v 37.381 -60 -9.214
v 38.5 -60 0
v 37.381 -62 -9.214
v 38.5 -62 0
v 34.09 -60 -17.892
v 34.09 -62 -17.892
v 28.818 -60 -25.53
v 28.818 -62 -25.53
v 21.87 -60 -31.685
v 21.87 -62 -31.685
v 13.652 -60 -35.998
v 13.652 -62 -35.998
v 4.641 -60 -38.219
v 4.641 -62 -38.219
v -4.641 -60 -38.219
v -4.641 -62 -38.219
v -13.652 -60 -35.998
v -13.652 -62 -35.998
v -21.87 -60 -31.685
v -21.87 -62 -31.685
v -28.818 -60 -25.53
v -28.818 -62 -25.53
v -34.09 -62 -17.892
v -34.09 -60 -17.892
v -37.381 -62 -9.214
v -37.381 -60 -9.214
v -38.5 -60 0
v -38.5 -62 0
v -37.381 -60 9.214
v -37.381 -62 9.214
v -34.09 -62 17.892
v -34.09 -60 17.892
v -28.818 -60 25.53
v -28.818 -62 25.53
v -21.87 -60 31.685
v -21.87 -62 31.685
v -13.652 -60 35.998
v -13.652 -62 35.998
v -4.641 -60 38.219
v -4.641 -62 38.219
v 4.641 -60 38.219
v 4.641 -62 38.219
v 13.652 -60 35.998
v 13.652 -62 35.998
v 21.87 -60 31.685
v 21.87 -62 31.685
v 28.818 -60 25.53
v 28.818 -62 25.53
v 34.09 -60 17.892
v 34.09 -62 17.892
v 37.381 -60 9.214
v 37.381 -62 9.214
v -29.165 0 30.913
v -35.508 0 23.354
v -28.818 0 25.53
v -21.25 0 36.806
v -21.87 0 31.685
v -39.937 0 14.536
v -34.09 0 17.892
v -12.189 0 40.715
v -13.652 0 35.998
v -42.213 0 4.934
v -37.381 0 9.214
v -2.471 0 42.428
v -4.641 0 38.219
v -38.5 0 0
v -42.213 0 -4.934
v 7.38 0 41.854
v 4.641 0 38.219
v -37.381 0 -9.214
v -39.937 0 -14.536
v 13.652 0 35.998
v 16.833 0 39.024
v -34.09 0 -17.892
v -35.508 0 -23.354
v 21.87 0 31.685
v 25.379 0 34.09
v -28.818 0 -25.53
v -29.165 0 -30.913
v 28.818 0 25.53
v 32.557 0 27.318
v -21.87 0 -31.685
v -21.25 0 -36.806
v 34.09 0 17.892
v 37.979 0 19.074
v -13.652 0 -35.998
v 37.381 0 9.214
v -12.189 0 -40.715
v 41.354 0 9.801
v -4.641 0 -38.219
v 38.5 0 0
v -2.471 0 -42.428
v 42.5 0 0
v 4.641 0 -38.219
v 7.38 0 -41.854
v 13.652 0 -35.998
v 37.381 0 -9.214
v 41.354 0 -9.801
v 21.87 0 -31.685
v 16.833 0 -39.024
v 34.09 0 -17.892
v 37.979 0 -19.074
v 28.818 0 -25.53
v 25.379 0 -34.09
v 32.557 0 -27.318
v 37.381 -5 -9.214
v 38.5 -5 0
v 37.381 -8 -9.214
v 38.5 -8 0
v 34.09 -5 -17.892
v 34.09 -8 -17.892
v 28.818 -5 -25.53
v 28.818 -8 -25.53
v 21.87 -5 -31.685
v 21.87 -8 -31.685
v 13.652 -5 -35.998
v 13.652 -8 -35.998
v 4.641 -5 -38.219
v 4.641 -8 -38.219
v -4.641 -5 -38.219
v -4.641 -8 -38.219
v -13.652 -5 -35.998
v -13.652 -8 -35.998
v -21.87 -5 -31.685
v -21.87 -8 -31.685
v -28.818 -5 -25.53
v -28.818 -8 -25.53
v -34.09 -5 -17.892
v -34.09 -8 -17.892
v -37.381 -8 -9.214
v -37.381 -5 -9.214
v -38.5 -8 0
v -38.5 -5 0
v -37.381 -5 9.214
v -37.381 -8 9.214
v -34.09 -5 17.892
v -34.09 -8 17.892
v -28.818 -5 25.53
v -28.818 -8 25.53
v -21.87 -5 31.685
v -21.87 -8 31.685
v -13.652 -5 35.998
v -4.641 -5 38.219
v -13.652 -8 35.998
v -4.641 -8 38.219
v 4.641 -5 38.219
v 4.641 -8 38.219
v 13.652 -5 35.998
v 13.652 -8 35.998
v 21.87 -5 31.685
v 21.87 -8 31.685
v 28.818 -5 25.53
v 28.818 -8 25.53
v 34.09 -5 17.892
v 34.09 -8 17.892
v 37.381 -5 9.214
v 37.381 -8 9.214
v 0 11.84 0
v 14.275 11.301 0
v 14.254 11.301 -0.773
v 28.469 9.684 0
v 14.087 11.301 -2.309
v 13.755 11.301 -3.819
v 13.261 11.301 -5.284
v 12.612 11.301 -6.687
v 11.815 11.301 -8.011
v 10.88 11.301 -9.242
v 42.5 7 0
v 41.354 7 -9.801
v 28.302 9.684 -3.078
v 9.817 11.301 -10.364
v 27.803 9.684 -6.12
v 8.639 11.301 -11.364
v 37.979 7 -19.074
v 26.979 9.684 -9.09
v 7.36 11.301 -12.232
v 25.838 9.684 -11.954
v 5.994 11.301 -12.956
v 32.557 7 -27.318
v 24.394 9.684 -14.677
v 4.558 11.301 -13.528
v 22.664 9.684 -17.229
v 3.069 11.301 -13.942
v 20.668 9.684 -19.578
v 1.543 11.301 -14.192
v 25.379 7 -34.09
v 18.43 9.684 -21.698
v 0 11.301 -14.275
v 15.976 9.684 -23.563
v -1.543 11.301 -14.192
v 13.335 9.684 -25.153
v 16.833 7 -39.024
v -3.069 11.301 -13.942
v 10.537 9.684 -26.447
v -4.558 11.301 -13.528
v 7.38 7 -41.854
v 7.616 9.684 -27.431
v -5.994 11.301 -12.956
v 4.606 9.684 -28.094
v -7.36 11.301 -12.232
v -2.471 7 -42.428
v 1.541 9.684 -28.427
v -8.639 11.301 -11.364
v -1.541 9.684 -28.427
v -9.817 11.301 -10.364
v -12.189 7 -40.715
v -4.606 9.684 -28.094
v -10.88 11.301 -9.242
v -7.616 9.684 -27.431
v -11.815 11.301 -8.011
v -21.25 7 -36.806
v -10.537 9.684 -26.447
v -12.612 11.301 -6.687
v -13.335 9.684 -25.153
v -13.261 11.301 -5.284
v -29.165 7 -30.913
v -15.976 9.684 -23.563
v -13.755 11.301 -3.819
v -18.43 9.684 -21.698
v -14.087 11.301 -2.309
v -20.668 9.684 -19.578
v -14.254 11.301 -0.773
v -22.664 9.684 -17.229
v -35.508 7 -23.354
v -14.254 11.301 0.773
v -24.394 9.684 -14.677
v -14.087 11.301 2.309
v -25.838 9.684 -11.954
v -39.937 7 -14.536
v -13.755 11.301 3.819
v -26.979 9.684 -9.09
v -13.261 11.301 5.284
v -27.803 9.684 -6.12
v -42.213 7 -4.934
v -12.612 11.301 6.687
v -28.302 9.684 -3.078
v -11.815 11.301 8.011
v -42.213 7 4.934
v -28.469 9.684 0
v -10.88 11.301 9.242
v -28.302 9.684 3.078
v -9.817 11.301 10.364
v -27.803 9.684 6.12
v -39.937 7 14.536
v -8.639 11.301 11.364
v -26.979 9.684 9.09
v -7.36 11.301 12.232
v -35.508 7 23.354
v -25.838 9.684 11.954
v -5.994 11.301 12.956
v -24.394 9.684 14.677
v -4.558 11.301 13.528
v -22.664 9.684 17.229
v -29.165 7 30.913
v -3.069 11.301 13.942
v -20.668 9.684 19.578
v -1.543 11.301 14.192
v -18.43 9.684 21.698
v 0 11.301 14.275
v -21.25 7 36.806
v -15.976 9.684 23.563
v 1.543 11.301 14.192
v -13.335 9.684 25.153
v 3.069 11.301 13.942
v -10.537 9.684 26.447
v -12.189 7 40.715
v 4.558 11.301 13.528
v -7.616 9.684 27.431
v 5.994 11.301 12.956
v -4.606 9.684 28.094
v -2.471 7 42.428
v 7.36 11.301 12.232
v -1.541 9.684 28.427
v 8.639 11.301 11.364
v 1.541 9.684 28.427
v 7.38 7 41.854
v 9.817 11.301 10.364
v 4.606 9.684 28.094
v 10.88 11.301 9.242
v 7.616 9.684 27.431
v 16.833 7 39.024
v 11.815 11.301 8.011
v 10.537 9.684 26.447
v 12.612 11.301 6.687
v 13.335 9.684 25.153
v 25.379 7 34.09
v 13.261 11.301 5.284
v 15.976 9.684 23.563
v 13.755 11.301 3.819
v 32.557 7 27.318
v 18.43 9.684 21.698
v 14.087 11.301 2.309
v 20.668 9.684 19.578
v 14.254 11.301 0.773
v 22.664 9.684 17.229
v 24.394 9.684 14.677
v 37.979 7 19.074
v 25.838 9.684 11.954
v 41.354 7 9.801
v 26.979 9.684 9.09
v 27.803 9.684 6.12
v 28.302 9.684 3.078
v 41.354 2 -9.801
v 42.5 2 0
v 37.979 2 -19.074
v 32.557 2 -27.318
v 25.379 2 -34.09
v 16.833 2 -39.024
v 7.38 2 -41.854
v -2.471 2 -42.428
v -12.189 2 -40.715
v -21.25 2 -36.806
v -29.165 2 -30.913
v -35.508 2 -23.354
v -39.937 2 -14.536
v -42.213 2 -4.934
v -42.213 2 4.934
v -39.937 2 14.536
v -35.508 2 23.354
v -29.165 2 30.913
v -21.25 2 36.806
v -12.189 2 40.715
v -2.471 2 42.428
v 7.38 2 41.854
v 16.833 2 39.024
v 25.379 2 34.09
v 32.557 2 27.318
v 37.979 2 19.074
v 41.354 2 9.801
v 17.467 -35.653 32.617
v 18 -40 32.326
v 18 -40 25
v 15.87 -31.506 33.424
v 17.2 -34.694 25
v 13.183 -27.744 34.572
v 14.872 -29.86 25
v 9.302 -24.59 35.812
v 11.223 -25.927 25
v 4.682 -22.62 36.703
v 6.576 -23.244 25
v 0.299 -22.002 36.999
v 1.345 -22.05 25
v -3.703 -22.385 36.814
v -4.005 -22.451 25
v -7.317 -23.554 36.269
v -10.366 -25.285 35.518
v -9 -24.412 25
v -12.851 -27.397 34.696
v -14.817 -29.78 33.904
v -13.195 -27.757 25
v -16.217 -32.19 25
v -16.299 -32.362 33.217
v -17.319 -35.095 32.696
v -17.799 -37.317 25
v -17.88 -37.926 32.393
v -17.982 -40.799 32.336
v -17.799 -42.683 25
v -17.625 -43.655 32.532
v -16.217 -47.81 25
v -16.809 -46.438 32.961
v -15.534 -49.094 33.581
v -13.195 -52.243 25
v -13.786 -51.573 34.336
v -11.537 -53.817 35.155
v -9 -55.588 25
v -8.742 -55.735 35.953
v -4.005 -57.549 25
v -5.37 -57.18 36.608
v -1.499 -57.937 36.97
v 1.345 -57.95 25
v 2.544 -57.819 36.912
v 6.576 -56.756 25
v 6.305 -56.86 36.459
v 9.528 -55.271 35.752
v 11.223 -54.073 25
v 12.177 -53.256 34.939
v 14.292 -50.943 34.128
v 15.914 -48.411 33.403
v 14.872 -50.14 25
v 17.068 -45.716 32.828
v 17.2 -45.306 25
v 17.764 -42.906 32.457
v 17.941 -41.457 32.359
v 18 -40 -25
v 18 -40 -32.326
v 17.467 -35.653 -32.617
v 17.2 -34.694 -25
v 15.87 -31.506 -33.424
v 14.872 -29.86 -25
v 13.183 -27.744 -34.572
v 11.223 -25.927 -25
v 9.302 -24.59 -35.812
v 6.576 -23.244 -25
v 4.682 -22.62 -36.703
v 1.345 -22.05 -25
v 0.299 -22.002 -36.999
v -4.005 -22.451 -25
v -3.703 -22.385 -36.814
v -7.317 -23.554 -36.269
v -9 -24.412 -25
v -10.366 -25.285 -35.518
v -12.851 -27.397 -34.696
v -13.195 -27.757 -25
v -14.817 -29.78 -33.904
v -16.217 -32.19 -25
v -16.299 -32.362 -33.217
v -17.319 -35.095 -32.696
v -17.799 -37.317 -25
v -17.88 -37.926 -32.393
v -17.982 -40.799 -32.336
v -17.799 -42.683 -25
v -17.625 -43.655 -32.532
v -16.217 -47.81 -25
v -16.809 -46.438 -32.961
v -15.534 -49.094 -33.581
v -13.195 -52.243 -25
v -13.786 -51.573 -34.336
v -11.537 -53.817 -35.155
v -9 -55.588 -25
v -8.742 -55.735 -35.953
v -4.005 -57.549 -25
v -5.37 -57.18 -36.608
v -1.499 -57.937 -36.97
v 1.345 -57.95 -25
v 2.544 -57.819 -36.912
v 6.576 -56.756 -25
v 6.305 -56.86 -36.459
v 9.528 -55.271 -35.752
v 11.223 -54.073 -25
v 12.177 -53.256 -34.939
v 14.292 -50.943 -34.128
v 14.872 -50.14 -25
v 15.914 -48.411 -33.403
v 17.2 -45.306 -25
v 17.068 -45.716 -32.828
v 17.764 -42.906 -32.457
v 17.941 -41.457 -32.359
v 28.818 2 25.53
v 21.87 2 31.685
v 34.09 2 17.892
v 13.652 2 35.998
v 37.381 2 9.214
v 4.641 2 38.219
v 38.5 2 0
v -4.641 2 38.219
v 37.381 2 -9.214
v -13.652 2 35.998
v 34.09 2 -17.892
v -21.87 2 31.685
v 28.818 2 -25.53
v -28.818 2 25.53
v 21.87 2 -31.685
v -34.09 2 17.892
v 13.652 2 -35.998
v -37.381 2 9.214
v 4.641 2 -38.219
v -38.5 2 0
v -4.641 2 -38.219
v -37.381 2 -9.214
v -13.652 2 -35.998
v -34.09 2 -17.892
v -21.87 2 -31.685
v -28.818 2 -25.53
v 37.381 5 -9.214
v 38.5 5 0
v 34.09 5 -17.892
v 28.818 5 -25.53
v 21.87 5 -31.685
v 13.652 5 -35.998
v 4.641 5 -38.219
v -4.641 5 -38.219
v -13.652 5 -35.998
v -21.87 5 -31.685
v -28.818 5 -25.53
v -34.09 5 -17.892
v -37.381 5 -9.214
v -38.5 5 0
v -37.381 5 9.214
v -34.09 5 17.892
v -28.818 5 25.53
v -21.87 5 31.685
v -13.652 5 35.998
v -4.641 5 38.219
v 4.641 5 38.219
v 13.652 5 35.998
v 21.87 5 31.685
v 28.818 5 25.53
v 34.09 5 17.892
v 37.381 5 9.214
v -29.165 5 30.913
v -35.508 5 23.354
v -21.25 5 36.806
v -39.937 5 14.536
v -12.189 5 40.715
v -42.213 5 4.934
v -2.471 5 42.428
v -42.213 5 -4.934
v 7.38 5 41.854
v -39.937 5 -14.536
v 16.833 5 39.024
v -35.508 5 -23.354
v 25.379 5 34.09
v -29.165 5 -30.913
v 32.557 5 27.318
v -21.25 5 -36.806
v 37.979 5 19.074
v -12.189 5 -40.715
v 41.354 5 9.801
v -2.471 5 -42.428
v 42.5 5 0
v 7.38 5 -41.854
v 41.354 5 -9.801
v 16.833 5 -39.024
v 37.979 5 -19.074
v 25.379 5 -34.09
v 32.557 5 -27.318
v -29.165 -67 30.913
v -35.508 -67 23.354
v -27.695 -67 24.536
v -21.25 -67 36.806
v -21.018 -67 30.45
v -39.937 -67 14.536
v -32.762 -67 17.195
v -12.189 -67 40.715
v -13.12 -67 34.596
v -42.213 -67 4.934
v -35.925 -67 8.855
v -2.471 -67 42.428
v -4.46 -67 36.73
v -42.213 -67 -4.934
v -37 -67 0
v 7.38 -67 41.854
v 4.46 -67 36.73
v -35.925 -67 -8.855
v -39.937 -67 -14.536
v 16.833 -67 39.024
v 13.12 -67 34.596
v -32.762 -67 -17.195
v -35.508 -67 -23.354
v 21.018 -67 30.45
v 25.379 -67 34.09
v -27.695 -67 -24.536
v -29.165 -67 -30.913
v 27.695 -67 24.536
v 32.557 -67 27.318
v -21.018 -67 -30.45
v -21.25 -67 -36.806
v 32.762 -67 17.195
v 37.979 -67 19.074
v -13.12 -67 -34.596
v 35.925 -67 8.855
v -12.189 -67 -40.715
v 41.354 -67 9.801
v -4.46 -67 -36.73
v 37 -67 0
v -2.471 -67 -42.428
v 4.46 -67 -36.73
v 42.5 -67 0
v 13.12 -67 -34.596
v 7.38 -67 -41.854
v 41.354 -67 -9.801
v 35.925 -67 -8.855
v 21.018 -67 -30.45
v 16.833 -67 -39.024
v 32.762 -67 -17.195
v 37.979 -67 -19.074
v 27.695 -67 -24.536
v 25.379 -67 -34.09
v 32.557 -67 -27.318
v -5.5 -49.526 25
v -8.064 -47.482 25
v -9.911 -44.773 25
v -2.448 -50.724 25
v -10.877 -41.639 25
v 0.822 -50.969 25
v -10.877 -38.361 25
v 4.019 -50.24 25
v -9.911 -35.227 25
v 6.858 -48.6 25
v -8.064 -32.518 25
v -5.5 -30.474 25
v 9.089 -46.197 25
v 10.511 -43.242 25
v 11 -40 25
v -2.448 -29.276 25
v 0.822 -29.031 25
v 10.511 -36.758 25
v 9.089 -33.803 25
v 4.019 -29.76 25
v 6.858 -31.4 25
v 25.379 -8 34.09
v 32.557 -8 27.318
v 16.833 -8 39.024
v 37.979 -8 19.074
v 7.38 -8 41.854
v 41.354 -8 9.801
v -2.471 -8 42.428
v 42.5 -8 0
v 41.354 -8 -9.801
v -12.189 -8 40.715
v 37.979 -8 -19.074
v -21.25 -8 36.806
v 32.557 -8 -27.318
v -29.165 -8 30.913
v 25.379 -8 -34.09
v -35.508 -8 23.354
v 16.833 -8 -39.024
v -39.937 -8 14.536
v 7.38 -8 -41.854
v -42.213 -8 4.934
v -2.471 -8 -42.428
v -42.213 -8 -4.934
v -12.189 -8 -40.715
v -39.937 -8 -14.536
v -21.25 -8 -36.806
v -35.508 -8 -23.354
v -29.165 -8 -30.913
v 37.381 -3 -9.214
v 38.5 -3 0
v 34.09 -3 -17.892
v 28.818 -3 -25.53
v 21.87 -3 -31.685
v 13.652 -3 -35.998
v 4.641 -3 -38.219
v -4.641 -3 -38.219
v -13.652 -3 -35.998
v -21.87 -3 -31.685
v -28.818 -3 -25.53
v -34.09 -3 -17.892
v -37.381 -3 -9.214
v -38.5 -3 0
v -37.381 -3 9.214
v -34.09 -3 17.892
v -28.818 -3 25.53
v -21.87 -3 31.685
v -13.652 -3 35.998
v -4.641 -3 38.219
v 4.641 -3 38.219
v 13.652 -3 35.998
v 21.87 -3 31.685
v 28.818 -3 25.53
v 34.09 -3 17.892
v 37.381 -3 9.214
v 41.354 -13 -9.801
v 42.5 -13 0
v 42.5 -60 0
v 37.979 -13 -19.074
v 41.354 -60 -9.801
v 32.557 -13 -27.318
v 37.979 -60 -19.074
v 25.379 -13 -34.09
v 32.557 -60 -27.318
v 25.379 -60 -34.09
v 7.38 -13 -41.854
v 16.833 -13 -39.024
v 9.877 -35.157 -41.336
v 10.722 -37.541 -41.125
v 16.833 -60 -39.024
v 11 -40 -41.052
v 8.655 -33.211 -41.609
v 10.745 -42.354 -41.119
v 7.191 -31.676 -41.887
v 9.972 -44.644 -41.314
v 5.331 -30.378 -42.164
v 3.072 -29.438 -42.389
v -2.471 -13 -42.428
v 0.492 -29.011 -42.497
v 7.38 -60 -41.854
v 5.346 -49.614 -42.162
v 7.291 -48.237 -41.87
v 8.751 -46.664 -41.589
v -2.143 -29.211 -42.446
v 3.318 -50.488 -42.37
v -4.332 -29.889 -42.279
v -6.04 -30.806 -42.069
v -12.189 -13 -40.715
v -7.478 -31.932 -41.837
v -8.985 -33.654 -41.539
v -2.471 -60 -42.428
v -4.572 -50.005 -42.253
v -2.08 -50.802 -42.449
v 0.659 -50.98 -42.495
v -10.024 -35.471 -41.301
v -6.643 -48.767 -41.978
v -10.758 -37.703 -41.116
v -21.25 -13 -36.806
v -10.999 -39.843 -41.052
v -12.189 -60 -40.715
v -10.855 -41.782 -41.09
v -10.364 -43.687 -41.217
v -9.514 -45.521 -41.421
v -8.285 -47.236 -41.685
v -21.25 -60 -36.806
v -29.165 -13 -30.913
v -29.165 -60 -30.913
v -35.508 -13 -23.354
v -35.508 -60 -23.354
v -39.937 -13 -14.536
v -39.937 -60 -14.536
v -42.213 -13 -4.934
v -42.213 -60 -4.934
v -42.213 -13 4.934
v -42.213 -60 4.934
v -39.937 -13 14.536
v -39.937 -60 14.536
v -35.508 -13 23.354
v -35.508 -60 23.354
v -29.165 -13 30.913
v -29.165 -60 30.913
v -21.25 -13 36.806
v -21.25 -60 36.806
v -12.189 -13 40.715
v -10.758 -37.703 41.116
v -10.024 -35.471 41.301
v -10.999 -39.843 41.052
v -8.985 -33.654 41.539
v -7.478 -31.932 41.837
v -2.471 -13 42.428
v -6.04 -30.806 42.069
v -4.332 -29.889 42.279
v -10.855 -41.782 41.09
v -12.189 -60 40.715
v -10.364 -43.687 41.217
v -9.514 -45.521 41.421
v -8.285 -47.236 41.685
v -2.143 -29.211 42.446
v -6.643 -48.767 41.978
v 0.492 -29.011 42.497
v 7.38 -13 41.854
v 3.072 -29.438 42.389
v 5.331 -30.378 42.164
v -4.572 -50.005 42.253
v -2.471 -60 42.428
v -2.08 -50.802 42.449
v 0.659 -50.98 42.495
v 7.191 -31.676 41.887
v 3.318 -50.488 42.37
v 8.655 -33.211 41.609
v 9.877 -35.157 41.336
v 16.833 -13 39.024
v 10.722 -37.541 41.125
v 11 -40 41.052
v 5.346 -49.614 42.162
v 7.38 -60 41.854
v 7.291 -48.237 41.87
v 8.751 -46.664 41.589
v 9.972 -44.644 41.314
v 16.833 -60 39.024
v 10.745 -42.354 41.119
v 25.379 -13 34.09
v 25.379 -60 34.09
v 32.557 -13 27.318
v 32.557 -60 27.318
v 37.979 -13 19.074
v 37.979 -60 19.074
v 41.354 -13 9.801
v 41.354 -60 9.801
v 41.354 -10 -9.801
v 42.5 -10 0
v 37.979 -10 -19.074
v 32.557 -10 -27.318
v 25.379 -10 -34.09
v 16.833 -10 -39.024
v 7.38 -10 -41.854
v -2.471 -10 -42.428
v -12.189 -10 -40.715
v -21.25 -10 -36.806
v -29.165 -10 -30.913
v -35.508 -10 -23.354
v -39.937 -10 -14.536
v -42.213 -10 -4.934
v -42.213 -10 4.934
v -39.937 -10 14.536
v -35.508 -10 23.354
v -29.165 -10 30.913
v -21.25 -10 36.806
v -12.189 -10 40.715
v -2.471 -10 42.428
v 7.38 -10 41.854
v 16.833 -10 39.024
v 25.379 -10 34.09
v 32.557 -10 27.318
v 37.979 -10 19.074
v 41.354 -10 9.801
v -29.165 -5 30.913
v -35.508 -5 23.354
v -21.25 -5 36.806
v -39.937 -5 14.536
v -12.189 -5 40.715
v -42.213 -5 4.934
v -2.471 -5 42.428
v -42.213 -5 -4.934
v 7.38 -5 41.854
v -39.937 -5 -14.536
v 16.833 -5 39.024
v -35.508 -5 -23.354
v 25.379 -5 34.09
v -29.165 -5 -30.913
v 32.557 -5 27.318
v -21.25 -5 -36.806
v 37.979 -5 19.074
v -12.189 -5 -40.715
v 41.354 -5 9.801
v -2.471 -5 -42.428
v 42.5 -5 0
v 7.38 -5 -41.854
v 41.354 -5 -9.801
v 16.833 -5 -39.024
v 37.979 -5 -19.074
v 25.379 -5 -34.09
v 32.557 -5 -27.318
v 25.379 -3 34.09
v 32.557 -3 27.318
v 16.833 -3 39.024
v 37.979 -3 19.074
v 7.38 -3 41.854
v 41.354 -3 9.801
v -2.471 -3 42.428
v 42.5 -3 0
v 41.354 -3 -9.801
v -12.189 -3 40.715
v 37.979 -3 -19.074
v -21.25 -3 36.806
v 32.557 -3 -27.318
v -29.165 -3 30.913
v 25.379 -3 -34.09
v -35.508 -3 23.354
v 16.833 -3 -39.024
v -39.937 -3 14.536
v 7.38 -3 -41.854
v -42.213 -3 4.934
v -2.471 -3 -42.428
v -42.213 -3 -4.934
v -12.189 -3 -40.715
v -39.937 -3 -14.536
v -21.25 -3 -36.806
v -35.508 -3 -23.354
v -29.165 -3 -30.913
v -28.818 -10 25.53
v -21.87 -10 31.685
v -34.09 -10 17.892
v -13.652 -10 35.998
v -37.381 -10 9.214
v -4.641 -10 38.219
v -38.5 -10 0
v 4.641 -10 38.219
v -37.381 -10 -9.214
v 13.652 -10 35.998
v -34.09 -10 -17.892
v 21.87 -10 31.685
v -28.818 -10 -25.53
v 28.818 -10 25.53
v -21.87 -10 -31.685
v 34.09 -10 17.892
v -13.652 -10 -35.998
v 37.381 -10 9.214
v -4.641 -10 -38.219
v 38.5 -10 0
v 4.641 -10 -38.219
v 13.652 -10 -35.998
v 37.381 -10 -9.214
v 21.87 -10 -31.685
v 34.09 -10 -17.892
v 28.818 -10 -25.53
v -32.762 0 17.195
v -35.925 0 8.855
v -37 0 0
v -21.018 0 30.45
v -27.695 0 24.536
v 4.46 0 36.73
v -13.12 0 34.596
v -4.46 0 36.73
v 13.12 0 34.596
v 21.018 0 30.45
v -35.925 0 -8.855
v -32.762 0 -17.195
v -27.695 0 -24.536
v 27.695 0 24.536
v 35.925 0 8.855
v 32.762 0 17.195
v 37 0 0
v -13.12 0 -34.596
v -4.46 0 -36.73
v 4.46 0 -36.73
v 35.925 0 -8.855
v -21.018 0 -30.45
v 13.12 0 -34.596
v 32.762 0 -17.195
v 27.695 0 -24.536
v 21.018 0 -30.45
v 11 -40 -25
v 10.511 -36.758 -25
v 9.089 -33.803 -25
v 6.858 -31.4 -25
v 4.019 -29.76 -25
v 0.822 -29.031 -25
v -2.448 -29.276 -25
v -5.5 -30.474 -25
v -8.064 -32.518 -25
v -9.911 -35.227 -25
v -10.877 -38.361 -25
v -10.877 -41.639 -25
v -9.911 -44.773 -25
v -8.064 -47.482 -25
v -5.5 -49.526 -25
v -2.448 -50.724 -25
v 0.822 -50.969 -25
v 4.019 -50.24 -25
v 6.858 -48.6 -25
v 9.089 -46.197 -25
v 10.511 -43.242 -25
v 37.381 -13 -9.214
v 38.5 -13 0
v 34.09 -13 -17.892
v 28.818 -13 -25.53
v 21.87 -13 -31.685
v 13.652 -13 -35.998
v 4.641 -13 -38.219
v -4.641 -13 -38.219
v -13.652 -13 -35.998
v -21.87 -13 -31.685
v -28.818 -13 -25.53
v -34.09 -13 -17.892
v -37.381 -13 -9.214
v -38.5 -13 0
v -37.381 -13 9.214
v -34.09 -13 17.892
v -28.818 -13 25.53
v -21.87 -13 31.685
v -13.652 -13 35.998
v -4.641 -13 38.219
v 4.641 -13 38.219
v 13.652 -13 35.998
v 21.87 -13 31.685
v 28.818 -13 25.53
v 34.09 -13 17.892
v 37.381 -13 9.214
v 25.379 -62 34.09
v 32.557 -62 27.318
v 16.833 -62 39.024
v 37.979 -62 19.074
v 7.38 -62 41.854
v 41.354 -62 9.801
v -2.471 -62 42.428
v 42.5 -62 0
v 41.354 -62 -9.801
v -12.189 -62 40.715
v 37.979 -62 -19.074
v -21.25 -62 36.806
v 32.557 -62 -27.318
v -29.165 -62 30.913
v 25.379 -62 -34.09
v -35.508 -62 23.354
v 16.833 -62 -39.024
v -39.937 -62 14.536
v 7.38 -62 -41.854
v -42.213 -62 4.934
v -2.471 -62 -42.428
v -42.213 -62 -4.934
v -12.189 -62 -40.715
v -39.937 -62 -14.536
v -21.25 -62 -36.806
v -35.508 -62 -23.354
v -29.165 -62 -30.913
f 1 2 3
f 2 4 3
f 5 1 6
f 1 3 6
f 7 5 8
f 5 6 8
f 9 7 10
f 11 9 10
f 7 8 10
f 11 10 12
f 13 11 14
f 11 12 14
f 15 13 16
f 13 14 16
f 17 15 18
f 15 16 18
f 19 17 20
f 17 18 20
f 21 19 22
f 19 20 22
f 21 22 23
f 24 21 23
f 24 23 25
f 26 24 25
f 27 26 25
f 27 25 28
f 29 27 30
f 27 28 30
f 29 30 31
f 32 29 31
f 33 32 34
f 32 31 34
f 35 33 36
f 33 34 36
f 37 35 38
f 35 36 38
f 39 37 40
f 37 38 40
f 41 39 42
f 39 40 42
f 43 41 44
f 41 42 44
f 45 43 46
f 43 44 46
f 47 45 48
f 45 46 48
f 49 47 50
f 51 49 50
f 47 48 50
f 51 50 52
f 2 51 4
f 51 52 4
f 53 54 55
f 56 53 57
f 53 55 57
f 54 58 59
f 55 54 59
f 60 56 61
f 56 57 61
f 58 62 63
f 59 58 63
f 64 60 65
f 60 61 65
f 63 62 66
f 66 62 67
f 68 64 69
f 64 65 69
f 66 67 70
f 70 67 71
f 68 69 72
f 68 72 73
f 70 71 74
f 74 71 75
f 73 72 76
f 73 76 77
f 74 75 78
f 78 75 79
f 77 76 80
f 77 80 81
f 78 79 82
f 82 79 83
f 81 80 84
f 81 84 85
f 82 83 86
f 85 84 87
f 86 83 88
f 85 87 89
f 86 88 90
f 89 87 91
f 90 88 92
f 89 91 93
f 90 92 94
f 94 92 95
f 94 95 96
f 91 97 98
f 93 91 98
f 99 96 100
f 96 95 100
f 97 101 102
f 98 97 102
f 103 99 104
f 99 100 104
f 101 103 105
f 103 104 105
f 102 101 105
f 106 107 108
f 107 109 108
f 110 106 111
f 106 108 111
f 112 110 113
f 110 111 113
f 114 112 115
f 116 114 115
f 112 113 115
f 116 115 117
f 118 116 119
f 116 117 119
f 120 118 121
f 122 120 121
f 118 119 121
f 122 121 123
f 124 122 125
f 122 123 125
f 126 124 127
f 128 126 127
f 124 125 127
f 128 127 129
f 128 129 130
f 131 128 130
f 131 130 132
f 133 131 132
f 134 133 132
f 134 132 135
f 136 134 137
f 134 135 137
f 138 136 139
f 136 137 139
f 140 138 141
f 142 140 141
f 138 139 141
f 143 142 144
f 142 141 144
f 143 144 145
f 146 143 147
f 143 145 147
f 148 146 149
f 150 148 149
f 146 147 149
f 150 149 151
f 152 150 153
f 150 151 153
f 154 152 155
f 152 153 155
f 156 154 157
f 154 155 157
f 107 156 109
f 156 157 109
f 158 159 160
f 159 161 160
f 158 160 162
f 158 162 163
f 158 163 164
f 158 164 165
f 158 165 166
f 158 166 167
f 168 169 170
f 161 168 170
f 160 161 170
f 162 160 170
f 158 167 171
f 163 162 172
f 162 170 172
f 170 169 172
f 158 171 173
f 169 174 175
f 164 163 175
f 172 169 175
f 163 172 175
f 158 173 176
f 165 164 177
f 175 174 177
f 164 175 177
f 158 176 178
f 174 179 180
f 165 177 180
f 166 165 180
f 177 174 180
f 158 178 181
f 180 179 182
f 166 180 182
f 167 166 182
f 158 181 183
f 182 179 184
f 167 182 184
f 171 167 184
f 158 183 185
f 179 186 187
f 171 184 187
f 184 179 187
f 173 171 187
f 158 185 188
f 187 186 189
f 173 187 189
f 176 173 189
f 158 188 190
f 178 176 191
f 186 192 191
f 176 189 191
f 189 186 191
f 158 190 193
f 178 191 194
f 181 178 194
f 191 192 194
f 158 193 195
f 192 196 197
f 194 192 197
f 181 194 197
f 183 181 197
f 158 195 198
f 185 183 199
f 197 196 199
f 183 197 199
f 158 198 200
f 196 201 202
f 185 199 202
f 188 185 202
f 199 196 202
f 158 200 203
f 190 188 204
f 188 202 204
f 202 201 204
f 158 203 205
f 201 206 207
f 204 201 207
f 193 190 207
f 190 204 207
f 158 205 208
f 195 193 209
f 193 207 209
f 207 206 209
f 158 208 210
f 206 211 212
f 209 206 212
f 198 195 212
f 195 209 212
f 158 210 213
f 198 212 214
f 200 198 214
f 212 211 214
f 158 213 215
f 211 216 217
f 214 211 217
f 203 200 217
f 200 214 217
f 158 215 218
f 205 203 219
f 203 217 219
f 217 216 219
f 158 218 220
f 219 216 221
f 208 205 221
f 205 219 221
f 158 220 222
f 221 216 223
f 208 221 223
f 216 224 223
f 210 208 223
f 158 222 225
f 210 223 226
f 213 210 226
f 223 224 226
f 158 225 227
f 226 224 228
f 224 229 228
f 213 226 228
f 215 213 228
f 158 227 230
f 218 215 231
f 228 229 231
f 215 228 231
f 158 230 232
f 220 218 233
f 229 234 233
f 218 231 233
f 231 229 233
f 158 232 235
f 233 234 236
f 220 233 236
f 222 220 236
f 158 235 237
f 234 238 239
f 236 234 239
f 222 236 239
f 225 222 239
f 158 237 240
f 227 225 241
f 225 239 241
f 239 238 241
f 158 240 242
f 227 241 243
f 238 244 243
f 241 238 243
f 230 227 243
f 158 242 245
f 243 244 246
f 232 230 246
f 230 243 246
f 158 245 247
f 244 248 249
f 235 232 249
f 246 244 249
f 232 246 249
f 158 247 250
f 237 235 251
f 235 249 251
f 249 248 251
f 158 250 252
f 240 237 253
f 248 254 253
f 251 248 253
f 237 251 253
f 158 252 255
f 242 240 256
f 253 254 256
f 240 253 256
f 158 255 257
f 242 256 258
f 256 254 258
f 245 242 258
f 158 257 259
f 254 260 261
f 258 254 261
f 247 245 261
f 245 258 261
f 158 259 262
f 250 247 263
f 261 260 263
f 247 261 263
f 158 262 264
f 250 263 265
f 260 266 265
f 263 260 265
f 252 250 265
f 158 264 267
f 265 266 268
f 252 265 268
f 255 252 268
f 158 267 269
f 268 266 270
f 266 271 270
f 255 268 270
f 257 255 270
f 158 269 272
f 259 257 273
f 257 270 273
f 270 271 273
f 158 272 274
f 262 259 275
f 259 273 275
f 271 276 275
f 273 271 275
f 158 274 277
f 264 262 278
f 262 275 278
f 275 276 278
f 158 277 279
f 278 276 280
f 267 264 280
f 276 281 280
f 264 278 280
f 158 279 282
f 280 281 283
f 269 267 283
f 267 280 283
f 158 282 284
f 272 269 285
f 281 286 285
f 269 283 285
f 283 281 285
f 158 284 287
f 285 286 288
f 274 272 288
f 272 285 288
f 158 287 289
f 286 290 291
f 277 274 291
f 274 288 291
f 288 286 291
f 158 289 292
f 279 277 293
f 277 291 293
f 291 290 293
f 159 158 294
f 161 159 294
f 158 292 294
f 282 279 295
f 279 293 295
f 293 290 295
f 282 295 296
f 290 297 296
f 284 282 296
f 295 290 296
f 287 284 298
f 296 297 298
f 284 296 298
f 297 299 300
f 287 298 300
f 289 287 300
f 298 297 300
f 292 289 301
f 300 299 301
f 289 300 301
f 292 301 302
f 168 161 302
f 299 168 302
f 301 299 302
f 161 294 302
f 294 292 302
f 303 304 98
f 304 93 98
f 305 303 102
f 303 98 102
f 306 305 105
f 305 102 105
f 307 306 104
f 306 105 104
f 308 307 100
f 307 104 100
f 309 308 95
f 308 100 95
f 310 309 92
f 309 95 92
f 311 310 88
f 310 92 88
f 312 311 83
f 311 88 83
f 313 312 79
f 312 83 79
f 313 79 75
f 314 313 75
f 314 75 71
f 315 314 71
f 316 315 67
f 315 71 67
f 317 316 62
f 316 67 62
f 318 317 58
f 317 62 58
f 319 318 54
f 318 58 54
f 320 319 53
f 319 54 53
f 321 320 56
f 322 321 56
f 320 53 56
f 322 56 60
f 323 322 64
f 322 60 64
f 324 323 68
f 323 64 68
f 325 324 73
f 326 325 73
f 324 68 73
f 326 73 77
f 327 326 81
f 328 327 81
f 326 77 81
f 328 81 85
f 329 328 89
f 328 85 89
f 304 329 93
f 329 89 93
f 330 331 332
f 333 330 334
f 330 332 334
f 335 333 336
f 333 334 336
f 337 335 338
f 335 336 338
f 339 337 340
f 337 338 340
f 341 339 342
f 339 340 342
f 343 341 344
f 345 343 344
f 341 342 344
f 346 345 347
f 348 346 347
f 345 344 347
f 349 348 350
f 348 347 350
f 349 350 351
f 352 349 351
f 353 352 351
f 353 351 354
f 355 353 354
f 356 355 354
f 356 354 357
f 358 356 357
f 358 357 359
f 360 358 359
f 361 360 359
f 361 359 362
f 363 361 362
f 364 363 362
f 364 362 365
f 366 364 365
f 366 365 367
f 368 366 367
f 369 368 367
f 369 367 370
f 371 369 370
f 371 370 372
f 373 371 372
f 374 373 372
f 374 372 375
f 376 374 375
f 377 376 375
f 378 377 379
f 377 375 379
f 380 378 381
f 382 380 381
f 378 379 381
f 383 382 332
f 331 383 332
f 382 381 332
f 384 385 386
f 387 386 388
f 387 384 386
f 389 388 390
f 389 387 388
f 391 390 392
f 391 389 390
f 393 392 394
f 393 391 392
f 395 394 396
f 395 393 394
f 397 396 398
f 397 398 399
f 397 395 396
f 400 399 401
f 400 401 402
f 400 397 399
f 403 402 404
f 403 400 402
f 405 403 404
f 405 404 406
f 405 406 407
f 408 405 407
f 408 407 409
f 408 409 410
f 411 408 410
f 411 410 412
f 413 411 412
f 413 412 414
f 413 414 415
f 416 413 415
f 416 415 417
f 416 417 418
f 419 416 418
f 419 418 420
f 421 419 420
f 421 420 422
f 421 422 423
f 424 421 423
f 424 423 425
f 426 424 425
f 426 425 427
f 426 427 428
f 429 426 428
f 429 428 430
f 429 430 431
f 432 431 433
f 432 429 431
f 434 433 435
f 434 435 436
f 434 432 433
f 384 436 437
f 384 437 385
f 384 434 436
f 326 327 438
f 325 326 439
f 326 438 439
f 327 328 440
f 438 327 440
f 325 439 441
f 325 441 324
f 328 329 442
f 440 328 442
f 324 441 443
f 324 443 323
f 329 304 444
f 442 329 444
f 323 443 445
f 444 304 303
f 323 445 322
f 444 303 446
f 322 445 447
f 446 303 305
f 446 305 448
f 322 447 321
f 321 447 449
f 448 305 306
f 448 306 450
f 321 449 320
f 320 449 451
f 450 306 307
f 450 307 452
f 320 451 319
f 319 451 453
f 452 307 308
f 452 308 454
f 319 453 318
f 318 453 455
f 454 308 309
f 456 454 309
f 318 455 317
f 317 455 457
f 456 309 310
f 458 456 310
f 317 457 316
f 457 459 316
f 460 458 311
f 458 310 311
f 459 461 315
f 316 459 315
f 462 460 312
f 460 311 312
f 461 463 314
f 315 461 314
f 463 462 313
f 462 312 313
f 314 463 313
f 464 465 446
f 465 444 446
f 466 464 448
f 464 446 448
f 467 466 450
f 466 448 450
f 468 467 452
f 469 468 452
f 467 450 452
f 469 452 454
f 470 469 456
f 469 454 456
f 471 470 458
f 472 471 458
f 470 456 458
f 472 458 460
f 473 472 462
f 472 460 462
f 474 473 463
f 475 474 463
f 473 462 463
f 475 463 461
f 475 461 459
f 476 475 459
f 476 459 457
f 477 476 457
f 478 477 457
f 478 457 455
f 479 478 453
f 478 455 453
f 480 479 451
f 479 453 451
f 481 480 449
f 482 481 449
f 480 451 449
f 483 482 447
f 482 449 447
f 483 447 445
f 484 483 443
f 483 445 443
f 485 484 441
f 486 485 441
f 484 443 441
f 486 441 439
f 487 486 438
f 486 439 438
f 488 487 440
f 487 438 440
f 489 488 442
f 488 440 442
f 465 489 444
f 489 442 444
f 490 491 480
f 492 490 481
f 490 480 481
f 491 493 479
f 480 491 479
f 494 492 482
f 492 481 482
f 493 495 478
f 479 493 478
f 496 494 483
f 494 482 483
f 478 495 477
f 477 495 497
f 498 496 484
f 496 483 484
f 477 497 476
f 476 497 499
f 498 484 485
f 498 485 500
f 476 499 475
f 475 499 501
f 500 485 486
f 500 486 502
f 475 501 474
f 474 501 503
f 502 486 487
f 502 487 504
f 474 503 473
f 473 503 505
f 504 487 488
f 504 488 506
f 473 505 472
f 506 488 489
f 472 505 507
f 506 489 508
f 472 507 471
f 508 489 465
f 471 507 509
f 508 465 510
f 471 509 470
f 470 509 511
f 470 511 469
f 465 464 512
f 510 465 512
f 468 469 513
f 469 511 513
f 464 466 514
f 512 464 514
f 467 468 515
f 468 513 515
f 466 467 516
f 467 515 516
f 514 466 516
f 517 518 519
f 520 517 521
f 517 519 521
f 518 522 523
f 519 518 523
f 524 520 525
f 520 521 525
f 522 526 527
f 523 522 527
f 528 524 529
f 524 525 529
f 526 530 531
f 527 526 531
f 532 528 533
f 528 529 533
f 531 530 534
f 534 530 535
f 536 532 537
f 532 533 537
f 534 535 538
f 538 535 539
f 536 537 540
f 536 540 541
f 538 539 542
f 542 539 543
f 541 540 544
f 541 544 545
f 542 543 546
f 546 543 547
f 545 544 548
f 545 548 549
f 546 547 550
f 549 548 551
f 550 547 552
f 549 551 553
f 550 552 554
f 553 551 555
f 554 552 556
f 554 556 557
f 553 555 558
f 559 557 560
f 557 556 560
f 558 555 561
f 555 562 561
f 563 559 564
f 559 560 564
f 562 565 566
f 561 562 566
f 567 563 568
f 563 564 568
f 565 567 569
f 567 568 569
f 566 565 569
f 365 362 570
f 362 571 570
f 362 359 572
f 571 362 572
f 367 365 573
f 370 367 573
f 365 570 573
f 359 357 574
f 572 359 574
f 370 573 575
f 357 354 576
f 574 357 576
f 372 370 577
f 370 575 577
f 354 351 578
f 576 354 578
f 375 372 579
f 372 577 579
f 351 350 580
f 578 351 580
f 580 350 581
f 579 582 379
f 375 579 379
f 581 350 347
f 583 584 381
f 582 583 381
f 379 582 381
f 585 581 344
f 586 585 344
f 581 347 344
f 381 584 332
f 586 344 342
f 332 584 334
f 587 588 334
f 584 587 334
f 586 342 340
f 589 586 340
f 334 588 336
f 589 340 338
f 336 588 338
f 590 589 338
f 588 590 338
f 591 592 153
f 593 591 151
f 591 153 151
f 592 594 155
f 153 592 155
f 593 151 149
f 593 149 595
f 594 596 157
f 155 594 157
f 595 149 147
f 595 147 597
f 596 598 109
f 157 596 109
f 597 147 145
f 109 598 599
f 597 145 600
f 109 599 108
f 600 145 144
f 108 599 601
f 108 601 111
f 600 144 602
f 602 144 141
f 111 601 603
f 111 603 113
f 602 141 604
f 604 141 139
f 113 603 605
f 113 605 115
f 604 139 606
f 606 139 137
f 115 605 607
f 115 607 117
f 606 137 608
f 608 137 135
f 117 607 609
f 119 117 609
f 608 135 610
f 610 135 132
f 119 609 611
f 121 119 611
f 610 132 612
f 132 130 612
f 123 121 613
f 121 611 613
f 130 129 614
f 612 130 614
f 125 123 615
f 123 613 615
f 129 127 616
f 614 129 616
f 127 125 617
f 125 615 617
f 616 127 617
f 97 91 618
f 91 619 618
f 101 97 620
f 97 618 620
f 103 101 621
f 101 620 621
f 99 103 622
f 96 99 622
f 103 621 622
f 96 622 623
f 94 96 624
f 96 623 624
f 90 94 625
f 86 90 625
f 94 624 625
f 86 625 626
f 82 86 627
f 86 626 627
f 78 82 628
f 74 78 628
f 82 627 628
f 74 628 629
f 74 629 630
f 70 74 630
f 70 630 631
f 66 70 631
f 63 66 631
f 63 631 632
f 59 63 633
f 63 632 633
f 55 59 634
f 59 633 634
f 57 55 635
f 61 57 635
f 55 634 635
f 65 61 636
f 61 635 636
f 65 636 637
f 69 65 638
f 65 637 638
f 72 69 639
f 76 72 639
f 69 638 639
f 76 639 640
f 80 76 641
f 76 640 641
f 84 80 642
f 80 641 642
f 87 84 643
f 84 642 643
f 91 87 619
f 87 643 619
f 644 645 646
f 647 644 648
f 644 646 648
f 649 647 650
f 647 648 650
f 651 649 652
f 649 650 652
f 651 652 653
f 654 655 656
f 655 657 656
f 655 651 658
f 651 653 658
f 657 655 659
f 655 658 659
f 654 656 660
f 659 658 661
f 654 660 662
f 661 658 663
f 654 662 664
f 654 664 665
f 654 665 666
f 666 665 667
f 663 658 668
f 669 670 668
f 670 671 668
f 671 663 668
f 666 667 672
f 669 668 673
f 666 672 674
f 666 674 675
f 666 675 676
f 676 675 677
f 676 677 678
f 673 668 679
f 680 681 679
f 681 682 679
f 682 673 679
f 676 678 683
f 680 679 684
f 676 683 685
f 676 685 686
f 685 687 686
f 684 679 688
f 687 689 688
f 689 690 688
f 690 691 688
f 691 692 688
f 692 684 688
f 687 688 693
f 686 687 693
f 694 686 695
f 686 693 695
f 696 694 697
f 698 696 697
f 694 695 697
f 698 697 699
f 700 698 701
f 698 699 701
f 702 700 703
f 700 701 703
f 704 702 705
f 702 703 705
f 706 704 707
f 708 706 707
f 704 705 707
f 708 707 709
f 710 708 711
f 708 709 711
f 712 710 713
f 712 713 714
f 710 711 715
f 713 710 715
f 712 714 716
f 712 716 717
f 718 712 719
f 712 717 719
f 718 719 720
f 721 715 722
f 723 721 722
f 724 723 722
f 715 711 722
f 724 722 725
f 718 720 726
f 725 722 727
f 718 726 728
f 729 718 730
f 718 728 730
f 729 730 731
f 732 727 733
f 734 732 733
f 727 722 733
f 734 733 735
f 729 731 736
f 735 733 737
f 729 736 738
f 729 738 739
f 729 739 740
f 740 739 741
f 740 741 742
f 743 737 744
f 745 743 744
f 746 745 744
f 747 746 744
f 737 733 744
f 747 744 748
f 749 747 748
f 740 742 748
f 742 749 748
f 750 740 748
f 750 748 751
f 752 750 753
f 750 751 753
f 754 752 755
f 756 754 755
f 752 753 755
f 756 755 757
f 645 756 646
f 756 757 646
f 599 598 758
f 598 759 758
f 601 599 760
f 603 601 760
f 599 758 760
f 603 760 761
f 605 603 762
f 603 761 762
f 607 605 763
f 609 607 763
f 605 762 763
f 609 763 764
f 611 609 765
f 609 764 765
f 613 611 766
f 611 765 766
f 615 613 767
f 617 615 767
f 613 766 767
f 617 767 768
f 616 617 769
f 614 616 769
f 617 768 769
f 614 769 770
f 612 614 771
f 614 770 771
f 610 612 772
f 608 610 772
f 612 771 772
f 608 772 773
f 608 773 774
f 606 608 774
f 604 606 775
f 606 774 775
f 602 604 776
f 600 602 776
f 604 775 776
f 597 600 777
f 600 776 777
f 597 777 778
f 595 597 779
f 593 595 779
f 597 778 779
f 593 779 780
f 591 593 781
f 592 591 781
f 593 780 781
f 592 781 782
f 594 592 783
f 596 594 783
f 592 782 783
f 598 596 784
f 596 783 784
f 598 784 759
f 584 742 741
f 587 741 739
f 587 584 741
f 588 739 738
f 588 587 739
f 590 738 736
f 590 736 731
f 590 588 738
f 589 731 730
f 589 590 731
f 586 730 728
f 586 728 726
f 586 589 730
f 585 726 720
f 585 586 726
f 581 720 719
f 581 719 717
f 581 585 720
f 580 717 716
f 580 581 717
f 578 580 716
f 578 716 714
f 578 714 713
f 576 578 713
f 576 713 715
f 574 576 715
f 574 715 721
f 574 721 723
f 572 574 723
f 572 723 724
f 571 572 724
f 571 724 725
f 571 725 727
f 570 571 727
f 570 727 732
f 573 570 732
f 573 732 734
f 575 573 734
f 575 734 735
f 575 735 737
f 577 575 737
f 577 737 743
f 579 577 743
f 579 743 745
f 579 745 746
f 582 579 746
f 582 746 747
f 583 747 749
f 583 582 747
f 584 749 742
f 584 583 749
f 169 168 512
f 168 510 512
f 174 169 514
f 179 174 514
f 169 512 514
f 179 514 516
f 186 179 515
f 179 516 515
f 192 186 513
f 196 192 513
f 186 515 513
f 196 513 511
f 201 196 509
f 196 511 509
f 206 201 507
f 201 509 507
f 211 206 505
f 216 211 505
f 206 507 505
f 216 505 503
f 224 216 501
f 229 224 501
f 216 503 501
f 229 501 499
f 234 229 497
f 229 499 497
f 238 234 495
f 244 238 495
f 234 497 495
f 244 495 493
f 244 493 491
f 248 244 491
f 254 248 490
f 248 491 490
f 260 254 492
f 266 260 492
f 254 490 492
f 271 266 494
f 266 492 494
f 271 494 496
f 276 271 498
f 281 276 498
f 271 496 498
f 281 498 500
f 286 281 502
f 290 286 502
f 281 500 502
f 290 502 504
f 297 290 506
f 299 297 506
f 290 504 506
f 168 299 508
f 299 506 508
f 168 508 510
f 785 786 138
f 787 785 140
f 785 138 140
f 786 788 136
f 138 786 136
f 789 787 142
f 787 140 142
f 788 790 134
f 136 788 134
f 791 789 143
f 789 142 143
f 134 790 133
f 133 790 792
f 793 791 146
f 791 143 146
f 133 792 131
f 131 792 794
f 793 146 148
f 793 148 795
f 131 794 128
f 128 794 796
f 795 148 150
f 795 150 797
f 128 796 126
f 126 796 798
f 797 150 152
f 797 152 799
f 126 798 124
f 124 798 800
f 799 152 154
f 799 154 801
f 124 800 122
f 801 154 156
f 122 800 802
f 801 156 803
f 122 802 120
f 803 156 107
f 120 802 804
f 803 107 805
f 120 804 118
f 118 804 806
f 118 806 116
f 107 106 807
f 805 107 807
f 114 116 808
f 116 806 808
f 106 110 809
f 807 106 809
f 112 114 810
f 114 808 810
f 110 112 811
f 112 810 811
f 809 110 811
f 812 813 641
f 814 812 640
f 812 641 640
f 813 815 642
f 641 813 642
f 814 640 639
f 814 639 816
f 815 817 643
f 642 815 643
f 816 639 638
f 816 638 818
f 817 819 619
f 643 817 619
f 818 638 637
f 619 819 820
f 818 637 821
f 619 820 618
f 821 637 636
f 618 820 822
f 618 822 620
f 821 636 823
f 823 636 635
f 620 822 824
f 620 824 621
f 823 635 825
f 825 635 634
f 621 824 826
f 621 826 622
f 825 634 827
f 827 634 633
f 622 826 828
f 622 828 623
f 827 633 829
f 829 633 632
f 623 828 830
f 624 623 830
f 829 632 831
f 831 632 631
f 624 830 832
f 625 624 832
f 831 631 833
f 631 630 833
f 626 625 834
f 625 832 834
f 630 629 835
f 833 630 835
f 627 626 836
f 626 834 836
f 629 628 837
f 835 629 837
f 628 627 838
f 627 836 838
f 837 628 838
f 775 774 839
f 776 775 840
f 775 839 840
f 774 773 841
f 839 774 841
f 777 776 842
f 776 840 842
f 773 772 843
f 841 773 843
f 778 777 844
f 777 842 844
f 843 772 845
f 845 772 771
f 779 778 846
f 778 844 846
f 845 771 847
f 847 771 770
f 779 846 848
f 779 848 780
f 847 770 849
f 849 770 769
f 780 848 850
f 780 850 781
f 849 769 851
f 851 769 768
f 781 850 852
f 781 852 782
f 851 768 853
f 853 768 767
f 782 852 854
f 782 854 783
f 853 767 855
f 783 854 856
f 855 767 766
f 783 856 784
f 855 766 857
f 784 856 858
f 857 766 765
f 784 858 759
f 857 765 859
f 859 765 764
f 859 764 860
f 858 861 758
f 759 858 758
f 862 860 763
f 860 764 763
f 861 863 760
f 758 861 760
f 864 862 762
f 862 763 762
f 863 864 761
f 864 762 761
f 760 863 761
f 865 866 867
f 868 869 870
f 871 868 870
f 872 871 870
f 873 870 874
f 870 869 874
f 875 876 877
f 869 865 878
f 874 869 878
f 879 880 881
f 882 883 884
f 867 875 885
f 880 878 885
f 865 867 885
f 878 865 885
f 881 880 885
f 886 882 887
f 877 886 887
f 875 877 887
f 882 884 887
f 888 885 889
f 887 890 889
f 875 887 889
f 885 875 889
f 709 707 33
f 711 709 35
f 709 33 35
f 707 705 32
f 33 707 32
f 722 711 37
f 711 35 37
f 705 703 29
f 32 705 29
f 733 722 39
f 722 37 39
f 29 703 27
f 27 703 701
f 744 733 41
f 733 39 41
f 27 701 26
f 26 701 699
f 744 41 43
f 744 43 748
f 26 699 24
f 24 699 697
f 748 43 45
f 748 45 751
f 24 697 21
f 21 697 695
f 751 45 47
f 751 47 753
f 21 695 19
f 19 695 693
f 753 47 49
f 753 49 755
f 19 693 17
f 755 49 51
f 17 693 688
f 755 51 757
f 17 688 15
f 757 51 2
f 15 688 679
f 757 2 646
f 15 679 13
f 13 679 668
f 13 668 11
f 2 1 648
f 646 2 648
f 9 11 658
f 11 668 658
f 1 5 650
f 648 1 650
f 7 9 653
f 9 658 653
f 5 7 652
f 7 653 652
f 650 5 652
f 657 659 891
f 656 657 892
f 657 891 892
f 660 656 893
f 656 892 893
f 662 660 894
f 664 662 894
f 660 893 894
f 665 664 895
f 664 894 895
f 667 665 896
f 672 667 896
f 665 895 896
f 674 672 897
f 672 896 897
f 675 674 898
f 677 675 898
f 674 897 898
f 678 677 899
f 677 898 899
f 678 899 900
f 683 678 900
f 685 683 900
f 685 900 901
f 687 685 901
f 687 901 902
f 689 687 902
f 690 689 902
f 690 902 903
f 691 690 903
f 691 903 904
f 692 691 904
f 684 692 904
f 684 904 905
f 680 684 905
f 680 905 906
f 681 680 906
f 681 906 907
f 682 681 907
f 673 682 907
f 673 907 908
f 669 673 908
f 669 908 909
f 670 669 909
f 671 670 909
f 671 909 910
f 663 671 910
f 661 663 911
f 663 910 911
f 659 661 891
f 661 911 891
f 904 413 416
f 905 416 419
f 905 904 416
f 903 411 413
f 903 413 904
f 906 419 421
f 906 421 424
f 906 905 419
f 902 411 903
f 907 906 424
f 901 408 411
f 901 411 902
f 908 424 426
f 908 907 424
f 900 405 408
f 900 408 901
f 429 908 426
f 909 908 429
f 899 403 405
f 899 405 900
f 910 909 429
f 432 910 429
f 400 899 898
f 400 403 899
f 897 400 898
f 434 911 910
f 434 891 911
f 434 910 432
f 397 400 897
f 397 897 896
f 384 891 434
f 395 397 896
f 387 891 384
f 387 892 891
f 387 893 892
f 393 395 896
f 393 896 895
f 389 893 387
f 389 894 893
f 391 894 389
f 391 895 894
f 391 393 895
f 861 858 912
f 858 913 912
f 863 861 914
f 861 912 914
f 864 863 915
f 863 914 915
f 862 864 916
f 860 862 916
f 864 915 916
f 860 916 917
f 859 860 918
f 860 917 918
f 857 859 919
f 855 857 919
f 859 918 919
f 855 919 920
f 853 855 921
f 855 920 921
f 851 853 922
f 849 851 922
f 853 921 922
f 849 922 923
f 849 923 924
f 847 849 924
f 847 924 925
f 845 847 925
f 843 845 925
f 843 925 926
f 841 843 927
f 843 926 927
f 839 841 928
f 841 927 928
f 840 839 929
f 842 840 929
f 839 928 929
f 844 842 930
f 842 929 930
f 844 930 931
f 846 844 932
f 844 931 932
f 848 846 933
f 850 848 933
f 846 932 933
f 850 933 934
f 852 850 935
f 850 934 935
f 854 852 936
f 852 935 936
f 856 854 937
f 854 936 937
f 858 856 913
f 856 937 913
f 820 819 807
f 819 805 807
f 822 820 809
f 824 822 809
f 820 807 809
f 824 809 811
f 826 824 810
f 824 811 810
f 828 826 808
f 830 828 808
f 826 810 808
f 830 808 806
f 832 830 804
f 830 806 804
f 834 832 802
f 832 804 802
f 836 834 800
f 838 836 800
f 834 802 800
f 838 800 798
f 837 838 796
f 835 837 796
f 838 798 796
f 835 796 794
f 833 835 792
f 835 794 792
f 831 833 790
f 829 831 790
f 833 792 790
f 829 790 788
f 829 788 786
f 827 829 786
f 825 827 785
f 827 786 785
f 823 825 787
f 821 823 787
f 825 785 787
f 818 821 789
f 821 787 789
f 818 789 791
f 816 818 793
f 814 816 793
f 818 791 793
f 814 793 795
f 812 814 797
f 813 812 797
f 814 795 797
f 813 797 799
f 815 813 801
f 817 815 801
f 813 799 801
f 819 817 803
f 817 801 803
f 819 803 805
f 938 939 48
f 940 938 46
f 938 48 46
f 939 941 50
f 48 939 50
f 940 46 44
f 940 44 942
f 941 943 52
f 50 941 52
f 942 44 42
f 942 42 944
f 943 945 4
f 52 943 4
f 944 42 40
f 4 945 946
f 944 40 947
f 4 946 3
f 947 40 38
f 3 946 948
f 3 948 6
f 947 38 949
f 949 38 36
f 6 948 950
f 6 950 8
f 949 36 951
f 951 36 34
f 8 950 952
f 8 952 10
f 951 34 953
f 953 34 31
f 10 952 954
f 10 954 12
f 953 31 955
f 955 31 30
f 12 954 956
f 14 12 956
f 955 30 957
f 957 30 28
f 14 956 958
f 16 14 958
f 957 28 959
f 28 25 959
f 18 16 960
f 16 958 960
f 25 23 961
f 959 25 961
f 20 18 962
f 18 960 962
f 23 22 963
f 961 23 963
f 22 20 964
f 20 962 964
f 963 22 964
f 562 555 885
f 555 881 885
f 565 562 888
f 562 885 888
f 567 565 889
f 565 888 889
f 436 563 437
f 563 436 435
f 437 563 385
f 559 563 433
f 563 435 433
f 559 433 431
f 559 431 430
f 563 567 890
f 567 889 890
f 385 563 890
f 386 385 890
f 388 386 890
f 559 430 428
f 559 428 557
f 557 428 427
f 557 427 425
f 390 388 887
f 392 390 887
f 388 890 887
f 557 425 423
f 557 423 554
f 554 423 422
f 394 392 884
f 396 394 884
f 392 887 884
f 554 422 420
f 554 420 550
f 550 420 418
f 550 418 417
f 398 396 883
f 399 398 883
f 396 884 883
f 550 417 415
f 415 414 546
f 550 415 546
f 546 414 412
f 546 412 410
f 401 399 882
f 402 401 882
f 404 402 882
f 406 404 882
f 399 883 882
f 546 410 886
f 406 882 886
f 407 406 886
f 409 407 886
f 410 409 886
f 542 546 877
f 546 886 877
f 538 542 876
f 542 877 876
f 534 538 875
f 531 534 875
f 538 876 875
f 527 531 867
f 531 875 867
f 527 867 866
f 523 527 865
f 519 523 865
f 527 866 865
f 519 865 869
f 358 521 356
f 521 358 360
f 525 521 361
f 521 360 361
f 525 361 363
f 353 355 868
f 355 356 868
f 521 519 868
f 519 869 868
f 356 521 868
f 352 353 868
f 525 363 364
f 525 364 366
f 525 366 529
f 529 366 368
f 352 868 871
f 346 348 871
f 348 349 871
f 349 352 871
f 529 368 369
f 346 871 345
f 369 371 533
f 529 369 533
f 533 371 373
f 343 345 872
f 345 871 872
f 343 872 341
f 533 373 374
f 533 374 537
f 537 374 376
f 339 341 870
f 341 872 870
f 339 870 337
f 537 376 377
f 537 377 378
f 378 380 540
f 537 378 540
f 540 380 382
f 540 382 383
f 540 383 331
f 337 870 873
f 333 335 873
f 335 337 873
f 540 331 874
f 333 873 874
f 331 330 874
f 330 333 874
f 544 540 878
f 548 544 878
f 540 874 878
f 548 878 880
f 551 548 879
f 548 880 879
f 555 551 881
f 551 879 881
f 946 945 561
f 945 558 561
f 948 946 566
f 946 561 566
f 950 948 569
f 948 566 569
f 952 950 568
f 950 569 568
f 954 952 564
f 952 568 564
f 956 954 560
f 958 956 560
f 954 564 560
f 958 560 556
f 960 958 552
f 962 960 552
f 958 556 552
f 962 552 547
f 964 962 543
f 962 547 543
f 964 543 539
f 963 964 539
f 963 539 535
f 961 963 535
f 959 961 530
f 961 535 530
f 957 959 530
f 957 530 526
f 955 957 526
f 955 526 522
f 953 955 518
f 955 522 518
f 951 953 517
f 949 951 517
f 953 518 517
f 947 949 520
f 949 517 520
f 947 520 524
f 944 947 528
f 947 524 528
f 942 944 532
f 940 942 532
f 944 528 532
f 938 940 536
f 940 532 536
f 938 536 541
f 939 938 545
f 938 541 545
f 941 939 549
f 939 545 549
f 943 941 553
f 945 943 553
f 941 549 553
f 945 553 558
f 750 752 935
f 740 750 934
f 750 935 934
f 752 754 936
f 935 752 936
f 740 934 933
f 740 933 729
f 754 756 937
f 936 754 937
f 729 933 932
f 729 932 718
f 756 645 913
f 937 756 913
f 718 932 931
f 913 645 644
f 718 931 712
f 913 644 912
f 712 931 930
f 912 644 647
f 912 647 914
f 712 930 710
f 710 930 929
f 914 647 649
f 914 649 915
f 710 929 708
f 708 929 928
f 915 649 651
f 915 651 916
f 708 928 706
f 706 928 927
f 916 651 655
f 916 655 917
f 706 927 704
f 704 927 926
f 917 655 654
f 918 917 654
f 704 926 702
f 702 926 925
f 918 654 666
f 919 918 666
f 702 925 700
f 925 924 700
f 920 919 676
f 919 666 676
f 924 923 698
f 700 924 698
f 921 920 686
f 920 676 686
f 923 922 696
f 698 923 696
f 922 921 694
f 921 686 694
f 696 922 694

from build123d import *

# Parameters (mm, degrees)
BOSS_EXTRUDE1_REACH     = 69.5
BOSS_EXTRUDE1_START     = 25
SKETCH2_R               = 18
BOSS_EXTRUDE2_REACH     = 69.5
BOSS_EXTRUDE2_START     = -25
SKETCH2_2_R             = 18
SKETCH3_R               = 11
CUT_EXTRUDE1_DEPTH      = 43.5
CUT_EXTRUDE1_DEPTH_BACK = 43.5


with BuildPart() as part:
    # Sketch1 → Revolve1 (revolve)
    with BuildSketch(Plane.XY):
        with BuildLine():
            Line((42.5, 7), (42.5, 5))
            Line((42.5, 5), (38.5, 5))
            Line((38.5, 5), (38.5, 2))
            Line((38.5, 2), (42.5, 2))
            Line((42.5, 2), (42.5, 0))
            Line((42.5, 0), (38.5, 0))
            Line((38.5, 0), (38.5, -3))
            Line((38.5, -3), (42.5, -3))
            Line((42.5, -3), (42.5, -5))
            Line((42.5, -5), (38.5, -5))
            Line((38.5, -5), (38.5, -8))
            Line((38.5, -8), (42.5, -8))
            Line((42.5, -8), (42.5, -10))
            Line((42.5, -10), (38.5, -10))
            Line((38.5, -10), (38.5, -13))
            Line((38.5, -13), (42.5, -13))
            Line((42.5, -13), (42.5, -60))
            Line((42.5, -60), (38.5, -60))
            Line((38.5, -60), (38.5, -62))
            Line((38.5, -62), (42.5, -62))
            Line((42.5, -62), (42.5, -67))
            Line((42.5, -67), (37, -67))
            Line((37, -67), (37, 0))
            Line((37, 0), (0, 0))
            Line((0, 0), (0, 11.840422459))
            ThreePointArc((0, 11.840422459), (21.387377642, 10.626417884), (42.5, 7))
        make_face()
    revolve(axis=Axis((0, 0, 0), (0, 1, 0)))

    # Sketch2 → Boss-Extrude1 (add, up to next)
    with BuildSketch(Plane.XY.offset(BOSS_EXTRUDE1_START), mode=Mode.PRIVATE) as boss_extrude1_sk1:
        with Locations((0, -40)):
            Circle(SKETCH2_R)
    boss_extrude1_tool1 = extrude(boss_extrude1_sk1.sketch, amount=BOSS_EXTRUDE1_REACH, mode=Mode.PRIVATE) - part.part
    add(boss_extrude1_tool1.solids().sort_by_distance((0, -40, 25))[0])

    # Sketch2<2> → Boss-Extrude2 (add, up to next)
    with BuildSketch(Plane.XY.offset(BOSS_EXTRUDE2_START), mode=Mode.PRIVATE) as boss_extrude2_sk1:
        with Locations((0, -40)):
            Circle(SKETCH2_2_R)
    boss_extrude2_tool1 = extrude(boss_extrude2_sk1.sketch, amount=-BOSS_EXTRUDE2_REACH, mode=Mode.PRIVATE) - part.part
    add(boss_extrude2_tool1.solids().sort_by_distance((0, -40, -25))[0])

    # Sketch3 → Cut-Extrude1 (cut, two sides)
    with BuildSketch(Plane.XY) as cut_extrude1_sk:
        with Locations((0, -40)):
            Circle(SKETCH3_R)
    extrude(amount=CUT_EXTRUDE1_DEPTH, mode=Mode.SUBTRACT)
    extrude(cut_extrude1_sk.sketch, amount=-CUT_EXTRUDE1_DEPTH_BACK, mode=Mode.SUBTRACT)


solid = part.part
